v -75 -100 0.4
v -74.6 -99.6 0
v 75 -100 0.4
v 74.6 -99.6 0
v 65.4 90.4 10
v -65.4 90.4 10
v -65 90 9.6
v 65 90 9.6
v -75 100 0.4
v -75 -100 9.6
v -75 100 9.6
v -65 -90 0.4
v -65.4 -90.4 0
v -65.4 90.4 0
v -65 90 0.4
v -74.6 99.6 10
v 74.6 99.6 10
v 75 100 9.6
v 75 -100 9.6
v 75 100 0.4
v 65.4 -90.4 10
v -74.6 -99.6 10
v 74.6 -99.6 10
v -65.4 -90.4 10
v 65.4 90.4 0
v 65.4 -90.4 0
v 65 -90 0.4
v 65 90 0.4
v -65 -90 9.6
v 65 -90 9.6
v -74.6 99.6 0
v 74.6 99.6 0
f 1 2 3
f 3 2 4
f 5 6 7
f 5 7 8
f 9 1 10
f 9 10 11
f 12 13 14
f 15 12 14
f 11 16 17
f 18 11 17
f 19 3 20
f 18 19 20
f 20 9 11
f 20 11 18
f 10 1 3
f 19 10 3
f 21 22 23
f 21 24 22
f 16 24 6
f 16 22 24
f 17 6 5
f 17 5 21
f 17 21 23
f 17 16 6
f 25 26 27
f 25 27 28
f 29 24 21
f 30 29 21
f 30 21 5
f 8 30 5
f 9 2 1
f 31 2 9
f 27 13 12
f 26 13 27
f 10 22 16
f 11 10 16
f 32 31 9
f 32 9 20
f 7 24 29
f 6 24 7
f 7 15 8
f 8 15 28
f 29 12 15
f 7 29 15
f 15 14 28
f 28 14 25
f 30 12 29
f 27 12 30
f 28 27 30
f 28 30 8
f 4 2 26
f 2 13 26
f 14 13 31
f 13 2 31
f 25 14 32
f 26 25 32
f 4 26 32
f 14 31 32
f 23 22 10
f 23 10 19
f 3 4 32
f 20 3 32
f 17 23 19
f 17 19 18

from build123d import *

# Parameters (mm, degrees)
F0_W     = 150
F0_H     = 200
F0_W_2   = 130
F0_H_2   = 180
F1_DEPTH = 10
F2_SIZE  = 0.4


with BuildPart() as f1:
    # F0 (on Top) → F1 (new body)
    with BuildSketch(Plane.XY):
        Rectangle(F0_W, F0_H)
        Rectangle(F0_W_2, F0_H_2, mode=Mode.SUBTRACT)
    extrude(amount=F1_DEPTH)

    # F2
    f2_edges = [f1.edges().sort_by_distance(p)[0] for p in [
        (75, 0, 10),
        (0, 100, 10),
        (-75, 0, 10),
        (0, -100, 10),
        (0, 90, 10),
        (65, 0, 10),
        (0, -90, 10),
        (-65, 0, 10),
        (75, 0, 0),
        (0, 100, 0),
        (-75, 0, 0),
        (0, -100, 0),
        (0, 90, 0),
        (65, 0, 0),
        (0, -90, 0),
        (-65, 0, 0),
    ]]
    chamfer(f2_edges, length=F2_SIZE)


solid = f1.part
